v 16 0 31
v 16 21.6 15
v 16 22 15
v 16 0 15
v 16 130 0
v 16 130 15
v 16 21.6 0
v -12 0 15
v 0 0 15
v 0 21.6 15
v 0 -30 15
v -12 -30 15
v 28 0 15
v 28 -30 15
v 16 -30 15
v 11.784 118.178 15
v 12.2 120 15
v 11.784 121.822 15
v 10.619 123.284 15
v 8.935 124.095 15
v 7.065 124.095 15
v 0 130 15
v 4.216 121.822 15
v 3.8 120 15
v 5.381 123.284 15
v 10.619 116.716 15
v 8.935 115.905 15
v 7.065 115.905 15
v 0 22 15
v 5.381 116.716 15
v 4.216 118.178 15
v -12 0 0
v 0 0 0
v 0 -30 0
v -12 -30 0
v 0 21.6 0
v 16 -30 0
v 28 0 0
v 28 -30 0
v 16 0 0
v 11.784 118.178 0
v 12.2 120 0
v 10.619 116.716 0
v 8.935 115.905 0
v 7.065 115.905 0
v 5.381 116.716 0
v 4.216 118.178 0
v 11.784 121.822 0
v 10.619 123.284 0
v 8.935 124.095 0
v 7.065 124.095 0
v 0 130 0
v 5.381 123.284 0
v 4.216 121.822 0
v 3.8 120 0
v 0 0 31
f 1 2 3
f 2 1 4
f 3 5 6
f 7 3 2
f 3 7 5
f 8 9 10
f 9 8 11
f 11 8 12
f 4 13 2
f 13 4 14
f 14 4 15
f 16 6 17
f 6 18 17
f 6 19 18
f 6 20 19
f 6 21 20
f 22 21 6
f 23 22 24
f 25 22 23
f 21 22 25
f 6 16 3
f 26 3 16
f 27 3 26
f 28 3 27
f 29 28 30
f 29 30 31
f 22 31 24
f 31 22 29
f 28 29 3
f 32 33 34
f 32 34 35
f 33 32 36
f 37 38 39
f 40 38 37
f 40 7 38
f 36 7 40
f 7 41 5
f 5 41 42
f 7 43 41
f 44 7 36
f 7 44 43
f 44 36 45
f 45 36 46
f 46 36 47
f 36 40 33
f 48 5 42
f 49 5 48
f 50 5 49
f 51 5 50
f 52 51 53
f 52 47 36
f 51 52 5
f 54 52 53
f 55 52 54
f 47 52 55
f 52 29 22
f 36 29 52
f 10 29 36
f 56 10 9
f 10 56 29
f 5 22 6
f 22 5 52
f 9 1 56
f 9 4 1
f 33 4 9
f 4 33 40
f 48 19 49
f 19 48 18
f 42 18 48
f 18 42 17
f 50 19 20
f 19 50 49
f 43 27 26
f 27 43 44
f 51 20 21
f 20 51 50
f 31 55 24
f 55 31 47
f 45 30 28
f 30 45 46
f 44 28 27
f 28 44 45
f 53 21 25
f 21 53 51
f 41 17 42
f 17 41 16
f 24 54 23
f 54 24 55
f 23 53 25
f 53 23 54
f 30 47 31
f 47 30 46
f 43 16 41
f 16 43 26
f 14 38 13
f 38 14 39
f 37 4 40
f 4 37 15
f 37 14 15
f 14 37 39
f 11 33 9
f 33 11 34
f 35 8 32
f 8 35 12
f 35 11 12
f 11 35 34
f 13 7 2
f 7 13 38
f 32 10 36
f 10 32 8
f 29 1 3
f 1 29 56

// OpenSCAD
difference(){
	cube([16,130,15]);
	translate([8,120,0]) cylinder(r1=4.2, r2=4.2, h= 16);
}
translate([16,-30,0]) cube([12,30,15]);
translate([-12,-30,0]) cube([12,30,15]);
translate([8,0,0]) 
	linear_extrude(height=15)
		polygon(points=[[-20,0],[0,36],[20,0]],path=[0,1,2]);

translate([16,0,15])
rotate([0,-90,0])
linear_extrude(height=16)
		polygon(points=[[0,0],[0,22],[16,0]],path=[0,1,2]);
